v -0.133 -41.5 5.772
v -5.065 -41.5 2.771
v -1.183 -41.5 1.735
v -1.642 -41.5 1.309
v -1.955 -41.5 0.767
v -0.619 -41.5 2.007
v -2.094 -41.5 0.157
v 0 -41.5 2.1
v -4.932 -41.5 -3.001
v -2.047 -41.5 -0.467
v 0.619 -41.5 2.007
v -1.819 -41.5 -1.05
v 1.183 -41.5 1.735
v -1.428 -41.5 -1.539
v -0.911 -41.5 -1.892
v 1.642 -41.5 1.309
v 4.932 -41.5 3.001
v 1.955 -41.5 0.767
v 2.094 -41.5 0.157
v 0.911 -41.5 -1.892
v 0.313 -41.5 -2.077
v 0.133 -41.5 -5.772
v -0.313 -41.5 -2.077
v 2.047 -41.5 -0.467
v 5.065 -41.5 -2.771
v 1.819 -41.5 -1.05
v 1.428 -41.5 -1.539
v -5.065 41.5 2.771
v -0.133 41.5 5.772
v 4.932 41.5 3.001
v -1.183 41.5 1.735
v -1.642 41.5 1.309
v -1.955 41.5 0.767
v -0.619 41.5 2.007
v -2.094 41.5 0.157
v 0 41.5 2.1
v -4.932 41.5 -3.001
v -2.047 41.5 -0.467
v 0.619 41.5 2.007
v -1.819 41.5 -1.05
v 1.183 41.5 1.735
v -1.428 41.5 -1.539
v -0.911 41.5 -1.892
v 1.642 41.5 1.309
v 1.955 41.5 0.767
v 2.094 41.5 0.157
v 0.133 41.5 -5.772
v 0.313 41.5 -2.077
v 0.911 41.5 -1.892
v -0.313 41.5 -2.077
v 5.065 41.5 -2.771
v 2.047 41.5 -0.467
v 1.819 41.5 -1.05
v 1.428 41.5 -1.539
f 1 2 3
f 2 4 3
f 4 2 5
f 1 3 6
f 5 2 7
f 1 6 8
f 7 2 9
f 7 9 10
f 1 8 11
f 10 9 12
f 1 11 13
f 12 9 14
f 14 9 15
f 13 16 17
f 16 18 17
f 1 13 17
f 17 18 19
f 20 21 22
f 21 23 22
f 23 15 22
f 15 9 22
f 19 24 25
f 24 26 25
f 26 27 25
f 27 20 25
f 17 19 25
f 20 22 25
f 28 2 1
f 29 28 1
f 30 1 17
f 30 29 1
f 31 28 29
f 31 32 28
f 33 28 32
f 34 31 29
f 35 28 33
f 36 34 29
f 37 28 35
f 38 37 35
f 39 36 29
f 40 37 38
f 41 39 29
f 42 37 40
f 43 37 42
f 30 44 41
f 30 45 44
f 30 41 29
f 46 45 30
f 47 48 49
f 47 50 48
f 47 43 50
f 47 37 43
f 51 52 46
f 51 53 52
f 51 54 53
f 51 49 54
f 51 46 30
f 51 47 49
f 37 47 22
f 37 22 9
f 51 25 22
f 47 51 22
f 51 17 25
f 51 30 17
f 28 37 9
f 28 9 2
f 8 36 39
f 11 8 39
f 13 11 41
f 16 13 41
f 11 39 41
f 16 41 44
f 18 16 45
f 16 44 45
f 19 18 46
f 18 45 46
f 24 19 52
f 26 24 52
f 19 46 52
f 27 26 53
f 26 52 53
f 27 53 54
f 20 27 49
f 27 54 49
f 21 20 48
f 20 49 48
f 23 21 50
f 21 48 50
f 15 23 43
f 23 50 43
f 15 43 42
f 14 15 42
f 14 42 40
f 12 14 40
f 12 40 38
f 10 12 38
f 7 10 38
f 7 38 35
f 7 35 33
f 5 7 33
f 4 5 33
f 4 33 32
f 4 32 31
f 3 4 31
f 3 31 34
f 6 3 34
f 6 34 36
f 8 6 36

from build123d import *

# Parameters (mm, degrees)
BOSS_EXTRUDE1_DEPTH = 41.5
CUT_EXTRUDE1_START  = 41.5
SKETCH1_3_R         = 2.1
CUT_EXTRUDE1_DEPTH  = 84.704514495


with BuildPart() as part:
    # Sketch1 → Boss-Extrude1 (new, symmetric)
    with BuildSketch(Plane(origin=(0, 0, 0), x_dir=(1, 0, 0), z_dir=(0, 1, 0))):
        Polygon((5.065112622, 2.770914552), (0.132873917, 5.77197348), (-4.932238705, 3.001058928), (-5.065112622, -2.770914552), (-0.132873917, -5.77197348), (4.932238705, -3.001058928), align=None)
    extrude(amount=BOSS_EXTRUDE1_DEPTH, both=True)

    # Sketch1<3> → Cut-Extrude1 (cut, through all)
    with BuildSketch(Plane(origin=(0, 0, 0), x_dir=(1, 0, 0), z_dir=(0, 1, 0)).offset(CUT_EXTRUDE1_START)):
        Circle(SKETCH1_3_R)
    extrude(amount=-CUT_EXTRUDE1_DEPTH, mode=Mode.SUBTRACT)


solid = part.part
